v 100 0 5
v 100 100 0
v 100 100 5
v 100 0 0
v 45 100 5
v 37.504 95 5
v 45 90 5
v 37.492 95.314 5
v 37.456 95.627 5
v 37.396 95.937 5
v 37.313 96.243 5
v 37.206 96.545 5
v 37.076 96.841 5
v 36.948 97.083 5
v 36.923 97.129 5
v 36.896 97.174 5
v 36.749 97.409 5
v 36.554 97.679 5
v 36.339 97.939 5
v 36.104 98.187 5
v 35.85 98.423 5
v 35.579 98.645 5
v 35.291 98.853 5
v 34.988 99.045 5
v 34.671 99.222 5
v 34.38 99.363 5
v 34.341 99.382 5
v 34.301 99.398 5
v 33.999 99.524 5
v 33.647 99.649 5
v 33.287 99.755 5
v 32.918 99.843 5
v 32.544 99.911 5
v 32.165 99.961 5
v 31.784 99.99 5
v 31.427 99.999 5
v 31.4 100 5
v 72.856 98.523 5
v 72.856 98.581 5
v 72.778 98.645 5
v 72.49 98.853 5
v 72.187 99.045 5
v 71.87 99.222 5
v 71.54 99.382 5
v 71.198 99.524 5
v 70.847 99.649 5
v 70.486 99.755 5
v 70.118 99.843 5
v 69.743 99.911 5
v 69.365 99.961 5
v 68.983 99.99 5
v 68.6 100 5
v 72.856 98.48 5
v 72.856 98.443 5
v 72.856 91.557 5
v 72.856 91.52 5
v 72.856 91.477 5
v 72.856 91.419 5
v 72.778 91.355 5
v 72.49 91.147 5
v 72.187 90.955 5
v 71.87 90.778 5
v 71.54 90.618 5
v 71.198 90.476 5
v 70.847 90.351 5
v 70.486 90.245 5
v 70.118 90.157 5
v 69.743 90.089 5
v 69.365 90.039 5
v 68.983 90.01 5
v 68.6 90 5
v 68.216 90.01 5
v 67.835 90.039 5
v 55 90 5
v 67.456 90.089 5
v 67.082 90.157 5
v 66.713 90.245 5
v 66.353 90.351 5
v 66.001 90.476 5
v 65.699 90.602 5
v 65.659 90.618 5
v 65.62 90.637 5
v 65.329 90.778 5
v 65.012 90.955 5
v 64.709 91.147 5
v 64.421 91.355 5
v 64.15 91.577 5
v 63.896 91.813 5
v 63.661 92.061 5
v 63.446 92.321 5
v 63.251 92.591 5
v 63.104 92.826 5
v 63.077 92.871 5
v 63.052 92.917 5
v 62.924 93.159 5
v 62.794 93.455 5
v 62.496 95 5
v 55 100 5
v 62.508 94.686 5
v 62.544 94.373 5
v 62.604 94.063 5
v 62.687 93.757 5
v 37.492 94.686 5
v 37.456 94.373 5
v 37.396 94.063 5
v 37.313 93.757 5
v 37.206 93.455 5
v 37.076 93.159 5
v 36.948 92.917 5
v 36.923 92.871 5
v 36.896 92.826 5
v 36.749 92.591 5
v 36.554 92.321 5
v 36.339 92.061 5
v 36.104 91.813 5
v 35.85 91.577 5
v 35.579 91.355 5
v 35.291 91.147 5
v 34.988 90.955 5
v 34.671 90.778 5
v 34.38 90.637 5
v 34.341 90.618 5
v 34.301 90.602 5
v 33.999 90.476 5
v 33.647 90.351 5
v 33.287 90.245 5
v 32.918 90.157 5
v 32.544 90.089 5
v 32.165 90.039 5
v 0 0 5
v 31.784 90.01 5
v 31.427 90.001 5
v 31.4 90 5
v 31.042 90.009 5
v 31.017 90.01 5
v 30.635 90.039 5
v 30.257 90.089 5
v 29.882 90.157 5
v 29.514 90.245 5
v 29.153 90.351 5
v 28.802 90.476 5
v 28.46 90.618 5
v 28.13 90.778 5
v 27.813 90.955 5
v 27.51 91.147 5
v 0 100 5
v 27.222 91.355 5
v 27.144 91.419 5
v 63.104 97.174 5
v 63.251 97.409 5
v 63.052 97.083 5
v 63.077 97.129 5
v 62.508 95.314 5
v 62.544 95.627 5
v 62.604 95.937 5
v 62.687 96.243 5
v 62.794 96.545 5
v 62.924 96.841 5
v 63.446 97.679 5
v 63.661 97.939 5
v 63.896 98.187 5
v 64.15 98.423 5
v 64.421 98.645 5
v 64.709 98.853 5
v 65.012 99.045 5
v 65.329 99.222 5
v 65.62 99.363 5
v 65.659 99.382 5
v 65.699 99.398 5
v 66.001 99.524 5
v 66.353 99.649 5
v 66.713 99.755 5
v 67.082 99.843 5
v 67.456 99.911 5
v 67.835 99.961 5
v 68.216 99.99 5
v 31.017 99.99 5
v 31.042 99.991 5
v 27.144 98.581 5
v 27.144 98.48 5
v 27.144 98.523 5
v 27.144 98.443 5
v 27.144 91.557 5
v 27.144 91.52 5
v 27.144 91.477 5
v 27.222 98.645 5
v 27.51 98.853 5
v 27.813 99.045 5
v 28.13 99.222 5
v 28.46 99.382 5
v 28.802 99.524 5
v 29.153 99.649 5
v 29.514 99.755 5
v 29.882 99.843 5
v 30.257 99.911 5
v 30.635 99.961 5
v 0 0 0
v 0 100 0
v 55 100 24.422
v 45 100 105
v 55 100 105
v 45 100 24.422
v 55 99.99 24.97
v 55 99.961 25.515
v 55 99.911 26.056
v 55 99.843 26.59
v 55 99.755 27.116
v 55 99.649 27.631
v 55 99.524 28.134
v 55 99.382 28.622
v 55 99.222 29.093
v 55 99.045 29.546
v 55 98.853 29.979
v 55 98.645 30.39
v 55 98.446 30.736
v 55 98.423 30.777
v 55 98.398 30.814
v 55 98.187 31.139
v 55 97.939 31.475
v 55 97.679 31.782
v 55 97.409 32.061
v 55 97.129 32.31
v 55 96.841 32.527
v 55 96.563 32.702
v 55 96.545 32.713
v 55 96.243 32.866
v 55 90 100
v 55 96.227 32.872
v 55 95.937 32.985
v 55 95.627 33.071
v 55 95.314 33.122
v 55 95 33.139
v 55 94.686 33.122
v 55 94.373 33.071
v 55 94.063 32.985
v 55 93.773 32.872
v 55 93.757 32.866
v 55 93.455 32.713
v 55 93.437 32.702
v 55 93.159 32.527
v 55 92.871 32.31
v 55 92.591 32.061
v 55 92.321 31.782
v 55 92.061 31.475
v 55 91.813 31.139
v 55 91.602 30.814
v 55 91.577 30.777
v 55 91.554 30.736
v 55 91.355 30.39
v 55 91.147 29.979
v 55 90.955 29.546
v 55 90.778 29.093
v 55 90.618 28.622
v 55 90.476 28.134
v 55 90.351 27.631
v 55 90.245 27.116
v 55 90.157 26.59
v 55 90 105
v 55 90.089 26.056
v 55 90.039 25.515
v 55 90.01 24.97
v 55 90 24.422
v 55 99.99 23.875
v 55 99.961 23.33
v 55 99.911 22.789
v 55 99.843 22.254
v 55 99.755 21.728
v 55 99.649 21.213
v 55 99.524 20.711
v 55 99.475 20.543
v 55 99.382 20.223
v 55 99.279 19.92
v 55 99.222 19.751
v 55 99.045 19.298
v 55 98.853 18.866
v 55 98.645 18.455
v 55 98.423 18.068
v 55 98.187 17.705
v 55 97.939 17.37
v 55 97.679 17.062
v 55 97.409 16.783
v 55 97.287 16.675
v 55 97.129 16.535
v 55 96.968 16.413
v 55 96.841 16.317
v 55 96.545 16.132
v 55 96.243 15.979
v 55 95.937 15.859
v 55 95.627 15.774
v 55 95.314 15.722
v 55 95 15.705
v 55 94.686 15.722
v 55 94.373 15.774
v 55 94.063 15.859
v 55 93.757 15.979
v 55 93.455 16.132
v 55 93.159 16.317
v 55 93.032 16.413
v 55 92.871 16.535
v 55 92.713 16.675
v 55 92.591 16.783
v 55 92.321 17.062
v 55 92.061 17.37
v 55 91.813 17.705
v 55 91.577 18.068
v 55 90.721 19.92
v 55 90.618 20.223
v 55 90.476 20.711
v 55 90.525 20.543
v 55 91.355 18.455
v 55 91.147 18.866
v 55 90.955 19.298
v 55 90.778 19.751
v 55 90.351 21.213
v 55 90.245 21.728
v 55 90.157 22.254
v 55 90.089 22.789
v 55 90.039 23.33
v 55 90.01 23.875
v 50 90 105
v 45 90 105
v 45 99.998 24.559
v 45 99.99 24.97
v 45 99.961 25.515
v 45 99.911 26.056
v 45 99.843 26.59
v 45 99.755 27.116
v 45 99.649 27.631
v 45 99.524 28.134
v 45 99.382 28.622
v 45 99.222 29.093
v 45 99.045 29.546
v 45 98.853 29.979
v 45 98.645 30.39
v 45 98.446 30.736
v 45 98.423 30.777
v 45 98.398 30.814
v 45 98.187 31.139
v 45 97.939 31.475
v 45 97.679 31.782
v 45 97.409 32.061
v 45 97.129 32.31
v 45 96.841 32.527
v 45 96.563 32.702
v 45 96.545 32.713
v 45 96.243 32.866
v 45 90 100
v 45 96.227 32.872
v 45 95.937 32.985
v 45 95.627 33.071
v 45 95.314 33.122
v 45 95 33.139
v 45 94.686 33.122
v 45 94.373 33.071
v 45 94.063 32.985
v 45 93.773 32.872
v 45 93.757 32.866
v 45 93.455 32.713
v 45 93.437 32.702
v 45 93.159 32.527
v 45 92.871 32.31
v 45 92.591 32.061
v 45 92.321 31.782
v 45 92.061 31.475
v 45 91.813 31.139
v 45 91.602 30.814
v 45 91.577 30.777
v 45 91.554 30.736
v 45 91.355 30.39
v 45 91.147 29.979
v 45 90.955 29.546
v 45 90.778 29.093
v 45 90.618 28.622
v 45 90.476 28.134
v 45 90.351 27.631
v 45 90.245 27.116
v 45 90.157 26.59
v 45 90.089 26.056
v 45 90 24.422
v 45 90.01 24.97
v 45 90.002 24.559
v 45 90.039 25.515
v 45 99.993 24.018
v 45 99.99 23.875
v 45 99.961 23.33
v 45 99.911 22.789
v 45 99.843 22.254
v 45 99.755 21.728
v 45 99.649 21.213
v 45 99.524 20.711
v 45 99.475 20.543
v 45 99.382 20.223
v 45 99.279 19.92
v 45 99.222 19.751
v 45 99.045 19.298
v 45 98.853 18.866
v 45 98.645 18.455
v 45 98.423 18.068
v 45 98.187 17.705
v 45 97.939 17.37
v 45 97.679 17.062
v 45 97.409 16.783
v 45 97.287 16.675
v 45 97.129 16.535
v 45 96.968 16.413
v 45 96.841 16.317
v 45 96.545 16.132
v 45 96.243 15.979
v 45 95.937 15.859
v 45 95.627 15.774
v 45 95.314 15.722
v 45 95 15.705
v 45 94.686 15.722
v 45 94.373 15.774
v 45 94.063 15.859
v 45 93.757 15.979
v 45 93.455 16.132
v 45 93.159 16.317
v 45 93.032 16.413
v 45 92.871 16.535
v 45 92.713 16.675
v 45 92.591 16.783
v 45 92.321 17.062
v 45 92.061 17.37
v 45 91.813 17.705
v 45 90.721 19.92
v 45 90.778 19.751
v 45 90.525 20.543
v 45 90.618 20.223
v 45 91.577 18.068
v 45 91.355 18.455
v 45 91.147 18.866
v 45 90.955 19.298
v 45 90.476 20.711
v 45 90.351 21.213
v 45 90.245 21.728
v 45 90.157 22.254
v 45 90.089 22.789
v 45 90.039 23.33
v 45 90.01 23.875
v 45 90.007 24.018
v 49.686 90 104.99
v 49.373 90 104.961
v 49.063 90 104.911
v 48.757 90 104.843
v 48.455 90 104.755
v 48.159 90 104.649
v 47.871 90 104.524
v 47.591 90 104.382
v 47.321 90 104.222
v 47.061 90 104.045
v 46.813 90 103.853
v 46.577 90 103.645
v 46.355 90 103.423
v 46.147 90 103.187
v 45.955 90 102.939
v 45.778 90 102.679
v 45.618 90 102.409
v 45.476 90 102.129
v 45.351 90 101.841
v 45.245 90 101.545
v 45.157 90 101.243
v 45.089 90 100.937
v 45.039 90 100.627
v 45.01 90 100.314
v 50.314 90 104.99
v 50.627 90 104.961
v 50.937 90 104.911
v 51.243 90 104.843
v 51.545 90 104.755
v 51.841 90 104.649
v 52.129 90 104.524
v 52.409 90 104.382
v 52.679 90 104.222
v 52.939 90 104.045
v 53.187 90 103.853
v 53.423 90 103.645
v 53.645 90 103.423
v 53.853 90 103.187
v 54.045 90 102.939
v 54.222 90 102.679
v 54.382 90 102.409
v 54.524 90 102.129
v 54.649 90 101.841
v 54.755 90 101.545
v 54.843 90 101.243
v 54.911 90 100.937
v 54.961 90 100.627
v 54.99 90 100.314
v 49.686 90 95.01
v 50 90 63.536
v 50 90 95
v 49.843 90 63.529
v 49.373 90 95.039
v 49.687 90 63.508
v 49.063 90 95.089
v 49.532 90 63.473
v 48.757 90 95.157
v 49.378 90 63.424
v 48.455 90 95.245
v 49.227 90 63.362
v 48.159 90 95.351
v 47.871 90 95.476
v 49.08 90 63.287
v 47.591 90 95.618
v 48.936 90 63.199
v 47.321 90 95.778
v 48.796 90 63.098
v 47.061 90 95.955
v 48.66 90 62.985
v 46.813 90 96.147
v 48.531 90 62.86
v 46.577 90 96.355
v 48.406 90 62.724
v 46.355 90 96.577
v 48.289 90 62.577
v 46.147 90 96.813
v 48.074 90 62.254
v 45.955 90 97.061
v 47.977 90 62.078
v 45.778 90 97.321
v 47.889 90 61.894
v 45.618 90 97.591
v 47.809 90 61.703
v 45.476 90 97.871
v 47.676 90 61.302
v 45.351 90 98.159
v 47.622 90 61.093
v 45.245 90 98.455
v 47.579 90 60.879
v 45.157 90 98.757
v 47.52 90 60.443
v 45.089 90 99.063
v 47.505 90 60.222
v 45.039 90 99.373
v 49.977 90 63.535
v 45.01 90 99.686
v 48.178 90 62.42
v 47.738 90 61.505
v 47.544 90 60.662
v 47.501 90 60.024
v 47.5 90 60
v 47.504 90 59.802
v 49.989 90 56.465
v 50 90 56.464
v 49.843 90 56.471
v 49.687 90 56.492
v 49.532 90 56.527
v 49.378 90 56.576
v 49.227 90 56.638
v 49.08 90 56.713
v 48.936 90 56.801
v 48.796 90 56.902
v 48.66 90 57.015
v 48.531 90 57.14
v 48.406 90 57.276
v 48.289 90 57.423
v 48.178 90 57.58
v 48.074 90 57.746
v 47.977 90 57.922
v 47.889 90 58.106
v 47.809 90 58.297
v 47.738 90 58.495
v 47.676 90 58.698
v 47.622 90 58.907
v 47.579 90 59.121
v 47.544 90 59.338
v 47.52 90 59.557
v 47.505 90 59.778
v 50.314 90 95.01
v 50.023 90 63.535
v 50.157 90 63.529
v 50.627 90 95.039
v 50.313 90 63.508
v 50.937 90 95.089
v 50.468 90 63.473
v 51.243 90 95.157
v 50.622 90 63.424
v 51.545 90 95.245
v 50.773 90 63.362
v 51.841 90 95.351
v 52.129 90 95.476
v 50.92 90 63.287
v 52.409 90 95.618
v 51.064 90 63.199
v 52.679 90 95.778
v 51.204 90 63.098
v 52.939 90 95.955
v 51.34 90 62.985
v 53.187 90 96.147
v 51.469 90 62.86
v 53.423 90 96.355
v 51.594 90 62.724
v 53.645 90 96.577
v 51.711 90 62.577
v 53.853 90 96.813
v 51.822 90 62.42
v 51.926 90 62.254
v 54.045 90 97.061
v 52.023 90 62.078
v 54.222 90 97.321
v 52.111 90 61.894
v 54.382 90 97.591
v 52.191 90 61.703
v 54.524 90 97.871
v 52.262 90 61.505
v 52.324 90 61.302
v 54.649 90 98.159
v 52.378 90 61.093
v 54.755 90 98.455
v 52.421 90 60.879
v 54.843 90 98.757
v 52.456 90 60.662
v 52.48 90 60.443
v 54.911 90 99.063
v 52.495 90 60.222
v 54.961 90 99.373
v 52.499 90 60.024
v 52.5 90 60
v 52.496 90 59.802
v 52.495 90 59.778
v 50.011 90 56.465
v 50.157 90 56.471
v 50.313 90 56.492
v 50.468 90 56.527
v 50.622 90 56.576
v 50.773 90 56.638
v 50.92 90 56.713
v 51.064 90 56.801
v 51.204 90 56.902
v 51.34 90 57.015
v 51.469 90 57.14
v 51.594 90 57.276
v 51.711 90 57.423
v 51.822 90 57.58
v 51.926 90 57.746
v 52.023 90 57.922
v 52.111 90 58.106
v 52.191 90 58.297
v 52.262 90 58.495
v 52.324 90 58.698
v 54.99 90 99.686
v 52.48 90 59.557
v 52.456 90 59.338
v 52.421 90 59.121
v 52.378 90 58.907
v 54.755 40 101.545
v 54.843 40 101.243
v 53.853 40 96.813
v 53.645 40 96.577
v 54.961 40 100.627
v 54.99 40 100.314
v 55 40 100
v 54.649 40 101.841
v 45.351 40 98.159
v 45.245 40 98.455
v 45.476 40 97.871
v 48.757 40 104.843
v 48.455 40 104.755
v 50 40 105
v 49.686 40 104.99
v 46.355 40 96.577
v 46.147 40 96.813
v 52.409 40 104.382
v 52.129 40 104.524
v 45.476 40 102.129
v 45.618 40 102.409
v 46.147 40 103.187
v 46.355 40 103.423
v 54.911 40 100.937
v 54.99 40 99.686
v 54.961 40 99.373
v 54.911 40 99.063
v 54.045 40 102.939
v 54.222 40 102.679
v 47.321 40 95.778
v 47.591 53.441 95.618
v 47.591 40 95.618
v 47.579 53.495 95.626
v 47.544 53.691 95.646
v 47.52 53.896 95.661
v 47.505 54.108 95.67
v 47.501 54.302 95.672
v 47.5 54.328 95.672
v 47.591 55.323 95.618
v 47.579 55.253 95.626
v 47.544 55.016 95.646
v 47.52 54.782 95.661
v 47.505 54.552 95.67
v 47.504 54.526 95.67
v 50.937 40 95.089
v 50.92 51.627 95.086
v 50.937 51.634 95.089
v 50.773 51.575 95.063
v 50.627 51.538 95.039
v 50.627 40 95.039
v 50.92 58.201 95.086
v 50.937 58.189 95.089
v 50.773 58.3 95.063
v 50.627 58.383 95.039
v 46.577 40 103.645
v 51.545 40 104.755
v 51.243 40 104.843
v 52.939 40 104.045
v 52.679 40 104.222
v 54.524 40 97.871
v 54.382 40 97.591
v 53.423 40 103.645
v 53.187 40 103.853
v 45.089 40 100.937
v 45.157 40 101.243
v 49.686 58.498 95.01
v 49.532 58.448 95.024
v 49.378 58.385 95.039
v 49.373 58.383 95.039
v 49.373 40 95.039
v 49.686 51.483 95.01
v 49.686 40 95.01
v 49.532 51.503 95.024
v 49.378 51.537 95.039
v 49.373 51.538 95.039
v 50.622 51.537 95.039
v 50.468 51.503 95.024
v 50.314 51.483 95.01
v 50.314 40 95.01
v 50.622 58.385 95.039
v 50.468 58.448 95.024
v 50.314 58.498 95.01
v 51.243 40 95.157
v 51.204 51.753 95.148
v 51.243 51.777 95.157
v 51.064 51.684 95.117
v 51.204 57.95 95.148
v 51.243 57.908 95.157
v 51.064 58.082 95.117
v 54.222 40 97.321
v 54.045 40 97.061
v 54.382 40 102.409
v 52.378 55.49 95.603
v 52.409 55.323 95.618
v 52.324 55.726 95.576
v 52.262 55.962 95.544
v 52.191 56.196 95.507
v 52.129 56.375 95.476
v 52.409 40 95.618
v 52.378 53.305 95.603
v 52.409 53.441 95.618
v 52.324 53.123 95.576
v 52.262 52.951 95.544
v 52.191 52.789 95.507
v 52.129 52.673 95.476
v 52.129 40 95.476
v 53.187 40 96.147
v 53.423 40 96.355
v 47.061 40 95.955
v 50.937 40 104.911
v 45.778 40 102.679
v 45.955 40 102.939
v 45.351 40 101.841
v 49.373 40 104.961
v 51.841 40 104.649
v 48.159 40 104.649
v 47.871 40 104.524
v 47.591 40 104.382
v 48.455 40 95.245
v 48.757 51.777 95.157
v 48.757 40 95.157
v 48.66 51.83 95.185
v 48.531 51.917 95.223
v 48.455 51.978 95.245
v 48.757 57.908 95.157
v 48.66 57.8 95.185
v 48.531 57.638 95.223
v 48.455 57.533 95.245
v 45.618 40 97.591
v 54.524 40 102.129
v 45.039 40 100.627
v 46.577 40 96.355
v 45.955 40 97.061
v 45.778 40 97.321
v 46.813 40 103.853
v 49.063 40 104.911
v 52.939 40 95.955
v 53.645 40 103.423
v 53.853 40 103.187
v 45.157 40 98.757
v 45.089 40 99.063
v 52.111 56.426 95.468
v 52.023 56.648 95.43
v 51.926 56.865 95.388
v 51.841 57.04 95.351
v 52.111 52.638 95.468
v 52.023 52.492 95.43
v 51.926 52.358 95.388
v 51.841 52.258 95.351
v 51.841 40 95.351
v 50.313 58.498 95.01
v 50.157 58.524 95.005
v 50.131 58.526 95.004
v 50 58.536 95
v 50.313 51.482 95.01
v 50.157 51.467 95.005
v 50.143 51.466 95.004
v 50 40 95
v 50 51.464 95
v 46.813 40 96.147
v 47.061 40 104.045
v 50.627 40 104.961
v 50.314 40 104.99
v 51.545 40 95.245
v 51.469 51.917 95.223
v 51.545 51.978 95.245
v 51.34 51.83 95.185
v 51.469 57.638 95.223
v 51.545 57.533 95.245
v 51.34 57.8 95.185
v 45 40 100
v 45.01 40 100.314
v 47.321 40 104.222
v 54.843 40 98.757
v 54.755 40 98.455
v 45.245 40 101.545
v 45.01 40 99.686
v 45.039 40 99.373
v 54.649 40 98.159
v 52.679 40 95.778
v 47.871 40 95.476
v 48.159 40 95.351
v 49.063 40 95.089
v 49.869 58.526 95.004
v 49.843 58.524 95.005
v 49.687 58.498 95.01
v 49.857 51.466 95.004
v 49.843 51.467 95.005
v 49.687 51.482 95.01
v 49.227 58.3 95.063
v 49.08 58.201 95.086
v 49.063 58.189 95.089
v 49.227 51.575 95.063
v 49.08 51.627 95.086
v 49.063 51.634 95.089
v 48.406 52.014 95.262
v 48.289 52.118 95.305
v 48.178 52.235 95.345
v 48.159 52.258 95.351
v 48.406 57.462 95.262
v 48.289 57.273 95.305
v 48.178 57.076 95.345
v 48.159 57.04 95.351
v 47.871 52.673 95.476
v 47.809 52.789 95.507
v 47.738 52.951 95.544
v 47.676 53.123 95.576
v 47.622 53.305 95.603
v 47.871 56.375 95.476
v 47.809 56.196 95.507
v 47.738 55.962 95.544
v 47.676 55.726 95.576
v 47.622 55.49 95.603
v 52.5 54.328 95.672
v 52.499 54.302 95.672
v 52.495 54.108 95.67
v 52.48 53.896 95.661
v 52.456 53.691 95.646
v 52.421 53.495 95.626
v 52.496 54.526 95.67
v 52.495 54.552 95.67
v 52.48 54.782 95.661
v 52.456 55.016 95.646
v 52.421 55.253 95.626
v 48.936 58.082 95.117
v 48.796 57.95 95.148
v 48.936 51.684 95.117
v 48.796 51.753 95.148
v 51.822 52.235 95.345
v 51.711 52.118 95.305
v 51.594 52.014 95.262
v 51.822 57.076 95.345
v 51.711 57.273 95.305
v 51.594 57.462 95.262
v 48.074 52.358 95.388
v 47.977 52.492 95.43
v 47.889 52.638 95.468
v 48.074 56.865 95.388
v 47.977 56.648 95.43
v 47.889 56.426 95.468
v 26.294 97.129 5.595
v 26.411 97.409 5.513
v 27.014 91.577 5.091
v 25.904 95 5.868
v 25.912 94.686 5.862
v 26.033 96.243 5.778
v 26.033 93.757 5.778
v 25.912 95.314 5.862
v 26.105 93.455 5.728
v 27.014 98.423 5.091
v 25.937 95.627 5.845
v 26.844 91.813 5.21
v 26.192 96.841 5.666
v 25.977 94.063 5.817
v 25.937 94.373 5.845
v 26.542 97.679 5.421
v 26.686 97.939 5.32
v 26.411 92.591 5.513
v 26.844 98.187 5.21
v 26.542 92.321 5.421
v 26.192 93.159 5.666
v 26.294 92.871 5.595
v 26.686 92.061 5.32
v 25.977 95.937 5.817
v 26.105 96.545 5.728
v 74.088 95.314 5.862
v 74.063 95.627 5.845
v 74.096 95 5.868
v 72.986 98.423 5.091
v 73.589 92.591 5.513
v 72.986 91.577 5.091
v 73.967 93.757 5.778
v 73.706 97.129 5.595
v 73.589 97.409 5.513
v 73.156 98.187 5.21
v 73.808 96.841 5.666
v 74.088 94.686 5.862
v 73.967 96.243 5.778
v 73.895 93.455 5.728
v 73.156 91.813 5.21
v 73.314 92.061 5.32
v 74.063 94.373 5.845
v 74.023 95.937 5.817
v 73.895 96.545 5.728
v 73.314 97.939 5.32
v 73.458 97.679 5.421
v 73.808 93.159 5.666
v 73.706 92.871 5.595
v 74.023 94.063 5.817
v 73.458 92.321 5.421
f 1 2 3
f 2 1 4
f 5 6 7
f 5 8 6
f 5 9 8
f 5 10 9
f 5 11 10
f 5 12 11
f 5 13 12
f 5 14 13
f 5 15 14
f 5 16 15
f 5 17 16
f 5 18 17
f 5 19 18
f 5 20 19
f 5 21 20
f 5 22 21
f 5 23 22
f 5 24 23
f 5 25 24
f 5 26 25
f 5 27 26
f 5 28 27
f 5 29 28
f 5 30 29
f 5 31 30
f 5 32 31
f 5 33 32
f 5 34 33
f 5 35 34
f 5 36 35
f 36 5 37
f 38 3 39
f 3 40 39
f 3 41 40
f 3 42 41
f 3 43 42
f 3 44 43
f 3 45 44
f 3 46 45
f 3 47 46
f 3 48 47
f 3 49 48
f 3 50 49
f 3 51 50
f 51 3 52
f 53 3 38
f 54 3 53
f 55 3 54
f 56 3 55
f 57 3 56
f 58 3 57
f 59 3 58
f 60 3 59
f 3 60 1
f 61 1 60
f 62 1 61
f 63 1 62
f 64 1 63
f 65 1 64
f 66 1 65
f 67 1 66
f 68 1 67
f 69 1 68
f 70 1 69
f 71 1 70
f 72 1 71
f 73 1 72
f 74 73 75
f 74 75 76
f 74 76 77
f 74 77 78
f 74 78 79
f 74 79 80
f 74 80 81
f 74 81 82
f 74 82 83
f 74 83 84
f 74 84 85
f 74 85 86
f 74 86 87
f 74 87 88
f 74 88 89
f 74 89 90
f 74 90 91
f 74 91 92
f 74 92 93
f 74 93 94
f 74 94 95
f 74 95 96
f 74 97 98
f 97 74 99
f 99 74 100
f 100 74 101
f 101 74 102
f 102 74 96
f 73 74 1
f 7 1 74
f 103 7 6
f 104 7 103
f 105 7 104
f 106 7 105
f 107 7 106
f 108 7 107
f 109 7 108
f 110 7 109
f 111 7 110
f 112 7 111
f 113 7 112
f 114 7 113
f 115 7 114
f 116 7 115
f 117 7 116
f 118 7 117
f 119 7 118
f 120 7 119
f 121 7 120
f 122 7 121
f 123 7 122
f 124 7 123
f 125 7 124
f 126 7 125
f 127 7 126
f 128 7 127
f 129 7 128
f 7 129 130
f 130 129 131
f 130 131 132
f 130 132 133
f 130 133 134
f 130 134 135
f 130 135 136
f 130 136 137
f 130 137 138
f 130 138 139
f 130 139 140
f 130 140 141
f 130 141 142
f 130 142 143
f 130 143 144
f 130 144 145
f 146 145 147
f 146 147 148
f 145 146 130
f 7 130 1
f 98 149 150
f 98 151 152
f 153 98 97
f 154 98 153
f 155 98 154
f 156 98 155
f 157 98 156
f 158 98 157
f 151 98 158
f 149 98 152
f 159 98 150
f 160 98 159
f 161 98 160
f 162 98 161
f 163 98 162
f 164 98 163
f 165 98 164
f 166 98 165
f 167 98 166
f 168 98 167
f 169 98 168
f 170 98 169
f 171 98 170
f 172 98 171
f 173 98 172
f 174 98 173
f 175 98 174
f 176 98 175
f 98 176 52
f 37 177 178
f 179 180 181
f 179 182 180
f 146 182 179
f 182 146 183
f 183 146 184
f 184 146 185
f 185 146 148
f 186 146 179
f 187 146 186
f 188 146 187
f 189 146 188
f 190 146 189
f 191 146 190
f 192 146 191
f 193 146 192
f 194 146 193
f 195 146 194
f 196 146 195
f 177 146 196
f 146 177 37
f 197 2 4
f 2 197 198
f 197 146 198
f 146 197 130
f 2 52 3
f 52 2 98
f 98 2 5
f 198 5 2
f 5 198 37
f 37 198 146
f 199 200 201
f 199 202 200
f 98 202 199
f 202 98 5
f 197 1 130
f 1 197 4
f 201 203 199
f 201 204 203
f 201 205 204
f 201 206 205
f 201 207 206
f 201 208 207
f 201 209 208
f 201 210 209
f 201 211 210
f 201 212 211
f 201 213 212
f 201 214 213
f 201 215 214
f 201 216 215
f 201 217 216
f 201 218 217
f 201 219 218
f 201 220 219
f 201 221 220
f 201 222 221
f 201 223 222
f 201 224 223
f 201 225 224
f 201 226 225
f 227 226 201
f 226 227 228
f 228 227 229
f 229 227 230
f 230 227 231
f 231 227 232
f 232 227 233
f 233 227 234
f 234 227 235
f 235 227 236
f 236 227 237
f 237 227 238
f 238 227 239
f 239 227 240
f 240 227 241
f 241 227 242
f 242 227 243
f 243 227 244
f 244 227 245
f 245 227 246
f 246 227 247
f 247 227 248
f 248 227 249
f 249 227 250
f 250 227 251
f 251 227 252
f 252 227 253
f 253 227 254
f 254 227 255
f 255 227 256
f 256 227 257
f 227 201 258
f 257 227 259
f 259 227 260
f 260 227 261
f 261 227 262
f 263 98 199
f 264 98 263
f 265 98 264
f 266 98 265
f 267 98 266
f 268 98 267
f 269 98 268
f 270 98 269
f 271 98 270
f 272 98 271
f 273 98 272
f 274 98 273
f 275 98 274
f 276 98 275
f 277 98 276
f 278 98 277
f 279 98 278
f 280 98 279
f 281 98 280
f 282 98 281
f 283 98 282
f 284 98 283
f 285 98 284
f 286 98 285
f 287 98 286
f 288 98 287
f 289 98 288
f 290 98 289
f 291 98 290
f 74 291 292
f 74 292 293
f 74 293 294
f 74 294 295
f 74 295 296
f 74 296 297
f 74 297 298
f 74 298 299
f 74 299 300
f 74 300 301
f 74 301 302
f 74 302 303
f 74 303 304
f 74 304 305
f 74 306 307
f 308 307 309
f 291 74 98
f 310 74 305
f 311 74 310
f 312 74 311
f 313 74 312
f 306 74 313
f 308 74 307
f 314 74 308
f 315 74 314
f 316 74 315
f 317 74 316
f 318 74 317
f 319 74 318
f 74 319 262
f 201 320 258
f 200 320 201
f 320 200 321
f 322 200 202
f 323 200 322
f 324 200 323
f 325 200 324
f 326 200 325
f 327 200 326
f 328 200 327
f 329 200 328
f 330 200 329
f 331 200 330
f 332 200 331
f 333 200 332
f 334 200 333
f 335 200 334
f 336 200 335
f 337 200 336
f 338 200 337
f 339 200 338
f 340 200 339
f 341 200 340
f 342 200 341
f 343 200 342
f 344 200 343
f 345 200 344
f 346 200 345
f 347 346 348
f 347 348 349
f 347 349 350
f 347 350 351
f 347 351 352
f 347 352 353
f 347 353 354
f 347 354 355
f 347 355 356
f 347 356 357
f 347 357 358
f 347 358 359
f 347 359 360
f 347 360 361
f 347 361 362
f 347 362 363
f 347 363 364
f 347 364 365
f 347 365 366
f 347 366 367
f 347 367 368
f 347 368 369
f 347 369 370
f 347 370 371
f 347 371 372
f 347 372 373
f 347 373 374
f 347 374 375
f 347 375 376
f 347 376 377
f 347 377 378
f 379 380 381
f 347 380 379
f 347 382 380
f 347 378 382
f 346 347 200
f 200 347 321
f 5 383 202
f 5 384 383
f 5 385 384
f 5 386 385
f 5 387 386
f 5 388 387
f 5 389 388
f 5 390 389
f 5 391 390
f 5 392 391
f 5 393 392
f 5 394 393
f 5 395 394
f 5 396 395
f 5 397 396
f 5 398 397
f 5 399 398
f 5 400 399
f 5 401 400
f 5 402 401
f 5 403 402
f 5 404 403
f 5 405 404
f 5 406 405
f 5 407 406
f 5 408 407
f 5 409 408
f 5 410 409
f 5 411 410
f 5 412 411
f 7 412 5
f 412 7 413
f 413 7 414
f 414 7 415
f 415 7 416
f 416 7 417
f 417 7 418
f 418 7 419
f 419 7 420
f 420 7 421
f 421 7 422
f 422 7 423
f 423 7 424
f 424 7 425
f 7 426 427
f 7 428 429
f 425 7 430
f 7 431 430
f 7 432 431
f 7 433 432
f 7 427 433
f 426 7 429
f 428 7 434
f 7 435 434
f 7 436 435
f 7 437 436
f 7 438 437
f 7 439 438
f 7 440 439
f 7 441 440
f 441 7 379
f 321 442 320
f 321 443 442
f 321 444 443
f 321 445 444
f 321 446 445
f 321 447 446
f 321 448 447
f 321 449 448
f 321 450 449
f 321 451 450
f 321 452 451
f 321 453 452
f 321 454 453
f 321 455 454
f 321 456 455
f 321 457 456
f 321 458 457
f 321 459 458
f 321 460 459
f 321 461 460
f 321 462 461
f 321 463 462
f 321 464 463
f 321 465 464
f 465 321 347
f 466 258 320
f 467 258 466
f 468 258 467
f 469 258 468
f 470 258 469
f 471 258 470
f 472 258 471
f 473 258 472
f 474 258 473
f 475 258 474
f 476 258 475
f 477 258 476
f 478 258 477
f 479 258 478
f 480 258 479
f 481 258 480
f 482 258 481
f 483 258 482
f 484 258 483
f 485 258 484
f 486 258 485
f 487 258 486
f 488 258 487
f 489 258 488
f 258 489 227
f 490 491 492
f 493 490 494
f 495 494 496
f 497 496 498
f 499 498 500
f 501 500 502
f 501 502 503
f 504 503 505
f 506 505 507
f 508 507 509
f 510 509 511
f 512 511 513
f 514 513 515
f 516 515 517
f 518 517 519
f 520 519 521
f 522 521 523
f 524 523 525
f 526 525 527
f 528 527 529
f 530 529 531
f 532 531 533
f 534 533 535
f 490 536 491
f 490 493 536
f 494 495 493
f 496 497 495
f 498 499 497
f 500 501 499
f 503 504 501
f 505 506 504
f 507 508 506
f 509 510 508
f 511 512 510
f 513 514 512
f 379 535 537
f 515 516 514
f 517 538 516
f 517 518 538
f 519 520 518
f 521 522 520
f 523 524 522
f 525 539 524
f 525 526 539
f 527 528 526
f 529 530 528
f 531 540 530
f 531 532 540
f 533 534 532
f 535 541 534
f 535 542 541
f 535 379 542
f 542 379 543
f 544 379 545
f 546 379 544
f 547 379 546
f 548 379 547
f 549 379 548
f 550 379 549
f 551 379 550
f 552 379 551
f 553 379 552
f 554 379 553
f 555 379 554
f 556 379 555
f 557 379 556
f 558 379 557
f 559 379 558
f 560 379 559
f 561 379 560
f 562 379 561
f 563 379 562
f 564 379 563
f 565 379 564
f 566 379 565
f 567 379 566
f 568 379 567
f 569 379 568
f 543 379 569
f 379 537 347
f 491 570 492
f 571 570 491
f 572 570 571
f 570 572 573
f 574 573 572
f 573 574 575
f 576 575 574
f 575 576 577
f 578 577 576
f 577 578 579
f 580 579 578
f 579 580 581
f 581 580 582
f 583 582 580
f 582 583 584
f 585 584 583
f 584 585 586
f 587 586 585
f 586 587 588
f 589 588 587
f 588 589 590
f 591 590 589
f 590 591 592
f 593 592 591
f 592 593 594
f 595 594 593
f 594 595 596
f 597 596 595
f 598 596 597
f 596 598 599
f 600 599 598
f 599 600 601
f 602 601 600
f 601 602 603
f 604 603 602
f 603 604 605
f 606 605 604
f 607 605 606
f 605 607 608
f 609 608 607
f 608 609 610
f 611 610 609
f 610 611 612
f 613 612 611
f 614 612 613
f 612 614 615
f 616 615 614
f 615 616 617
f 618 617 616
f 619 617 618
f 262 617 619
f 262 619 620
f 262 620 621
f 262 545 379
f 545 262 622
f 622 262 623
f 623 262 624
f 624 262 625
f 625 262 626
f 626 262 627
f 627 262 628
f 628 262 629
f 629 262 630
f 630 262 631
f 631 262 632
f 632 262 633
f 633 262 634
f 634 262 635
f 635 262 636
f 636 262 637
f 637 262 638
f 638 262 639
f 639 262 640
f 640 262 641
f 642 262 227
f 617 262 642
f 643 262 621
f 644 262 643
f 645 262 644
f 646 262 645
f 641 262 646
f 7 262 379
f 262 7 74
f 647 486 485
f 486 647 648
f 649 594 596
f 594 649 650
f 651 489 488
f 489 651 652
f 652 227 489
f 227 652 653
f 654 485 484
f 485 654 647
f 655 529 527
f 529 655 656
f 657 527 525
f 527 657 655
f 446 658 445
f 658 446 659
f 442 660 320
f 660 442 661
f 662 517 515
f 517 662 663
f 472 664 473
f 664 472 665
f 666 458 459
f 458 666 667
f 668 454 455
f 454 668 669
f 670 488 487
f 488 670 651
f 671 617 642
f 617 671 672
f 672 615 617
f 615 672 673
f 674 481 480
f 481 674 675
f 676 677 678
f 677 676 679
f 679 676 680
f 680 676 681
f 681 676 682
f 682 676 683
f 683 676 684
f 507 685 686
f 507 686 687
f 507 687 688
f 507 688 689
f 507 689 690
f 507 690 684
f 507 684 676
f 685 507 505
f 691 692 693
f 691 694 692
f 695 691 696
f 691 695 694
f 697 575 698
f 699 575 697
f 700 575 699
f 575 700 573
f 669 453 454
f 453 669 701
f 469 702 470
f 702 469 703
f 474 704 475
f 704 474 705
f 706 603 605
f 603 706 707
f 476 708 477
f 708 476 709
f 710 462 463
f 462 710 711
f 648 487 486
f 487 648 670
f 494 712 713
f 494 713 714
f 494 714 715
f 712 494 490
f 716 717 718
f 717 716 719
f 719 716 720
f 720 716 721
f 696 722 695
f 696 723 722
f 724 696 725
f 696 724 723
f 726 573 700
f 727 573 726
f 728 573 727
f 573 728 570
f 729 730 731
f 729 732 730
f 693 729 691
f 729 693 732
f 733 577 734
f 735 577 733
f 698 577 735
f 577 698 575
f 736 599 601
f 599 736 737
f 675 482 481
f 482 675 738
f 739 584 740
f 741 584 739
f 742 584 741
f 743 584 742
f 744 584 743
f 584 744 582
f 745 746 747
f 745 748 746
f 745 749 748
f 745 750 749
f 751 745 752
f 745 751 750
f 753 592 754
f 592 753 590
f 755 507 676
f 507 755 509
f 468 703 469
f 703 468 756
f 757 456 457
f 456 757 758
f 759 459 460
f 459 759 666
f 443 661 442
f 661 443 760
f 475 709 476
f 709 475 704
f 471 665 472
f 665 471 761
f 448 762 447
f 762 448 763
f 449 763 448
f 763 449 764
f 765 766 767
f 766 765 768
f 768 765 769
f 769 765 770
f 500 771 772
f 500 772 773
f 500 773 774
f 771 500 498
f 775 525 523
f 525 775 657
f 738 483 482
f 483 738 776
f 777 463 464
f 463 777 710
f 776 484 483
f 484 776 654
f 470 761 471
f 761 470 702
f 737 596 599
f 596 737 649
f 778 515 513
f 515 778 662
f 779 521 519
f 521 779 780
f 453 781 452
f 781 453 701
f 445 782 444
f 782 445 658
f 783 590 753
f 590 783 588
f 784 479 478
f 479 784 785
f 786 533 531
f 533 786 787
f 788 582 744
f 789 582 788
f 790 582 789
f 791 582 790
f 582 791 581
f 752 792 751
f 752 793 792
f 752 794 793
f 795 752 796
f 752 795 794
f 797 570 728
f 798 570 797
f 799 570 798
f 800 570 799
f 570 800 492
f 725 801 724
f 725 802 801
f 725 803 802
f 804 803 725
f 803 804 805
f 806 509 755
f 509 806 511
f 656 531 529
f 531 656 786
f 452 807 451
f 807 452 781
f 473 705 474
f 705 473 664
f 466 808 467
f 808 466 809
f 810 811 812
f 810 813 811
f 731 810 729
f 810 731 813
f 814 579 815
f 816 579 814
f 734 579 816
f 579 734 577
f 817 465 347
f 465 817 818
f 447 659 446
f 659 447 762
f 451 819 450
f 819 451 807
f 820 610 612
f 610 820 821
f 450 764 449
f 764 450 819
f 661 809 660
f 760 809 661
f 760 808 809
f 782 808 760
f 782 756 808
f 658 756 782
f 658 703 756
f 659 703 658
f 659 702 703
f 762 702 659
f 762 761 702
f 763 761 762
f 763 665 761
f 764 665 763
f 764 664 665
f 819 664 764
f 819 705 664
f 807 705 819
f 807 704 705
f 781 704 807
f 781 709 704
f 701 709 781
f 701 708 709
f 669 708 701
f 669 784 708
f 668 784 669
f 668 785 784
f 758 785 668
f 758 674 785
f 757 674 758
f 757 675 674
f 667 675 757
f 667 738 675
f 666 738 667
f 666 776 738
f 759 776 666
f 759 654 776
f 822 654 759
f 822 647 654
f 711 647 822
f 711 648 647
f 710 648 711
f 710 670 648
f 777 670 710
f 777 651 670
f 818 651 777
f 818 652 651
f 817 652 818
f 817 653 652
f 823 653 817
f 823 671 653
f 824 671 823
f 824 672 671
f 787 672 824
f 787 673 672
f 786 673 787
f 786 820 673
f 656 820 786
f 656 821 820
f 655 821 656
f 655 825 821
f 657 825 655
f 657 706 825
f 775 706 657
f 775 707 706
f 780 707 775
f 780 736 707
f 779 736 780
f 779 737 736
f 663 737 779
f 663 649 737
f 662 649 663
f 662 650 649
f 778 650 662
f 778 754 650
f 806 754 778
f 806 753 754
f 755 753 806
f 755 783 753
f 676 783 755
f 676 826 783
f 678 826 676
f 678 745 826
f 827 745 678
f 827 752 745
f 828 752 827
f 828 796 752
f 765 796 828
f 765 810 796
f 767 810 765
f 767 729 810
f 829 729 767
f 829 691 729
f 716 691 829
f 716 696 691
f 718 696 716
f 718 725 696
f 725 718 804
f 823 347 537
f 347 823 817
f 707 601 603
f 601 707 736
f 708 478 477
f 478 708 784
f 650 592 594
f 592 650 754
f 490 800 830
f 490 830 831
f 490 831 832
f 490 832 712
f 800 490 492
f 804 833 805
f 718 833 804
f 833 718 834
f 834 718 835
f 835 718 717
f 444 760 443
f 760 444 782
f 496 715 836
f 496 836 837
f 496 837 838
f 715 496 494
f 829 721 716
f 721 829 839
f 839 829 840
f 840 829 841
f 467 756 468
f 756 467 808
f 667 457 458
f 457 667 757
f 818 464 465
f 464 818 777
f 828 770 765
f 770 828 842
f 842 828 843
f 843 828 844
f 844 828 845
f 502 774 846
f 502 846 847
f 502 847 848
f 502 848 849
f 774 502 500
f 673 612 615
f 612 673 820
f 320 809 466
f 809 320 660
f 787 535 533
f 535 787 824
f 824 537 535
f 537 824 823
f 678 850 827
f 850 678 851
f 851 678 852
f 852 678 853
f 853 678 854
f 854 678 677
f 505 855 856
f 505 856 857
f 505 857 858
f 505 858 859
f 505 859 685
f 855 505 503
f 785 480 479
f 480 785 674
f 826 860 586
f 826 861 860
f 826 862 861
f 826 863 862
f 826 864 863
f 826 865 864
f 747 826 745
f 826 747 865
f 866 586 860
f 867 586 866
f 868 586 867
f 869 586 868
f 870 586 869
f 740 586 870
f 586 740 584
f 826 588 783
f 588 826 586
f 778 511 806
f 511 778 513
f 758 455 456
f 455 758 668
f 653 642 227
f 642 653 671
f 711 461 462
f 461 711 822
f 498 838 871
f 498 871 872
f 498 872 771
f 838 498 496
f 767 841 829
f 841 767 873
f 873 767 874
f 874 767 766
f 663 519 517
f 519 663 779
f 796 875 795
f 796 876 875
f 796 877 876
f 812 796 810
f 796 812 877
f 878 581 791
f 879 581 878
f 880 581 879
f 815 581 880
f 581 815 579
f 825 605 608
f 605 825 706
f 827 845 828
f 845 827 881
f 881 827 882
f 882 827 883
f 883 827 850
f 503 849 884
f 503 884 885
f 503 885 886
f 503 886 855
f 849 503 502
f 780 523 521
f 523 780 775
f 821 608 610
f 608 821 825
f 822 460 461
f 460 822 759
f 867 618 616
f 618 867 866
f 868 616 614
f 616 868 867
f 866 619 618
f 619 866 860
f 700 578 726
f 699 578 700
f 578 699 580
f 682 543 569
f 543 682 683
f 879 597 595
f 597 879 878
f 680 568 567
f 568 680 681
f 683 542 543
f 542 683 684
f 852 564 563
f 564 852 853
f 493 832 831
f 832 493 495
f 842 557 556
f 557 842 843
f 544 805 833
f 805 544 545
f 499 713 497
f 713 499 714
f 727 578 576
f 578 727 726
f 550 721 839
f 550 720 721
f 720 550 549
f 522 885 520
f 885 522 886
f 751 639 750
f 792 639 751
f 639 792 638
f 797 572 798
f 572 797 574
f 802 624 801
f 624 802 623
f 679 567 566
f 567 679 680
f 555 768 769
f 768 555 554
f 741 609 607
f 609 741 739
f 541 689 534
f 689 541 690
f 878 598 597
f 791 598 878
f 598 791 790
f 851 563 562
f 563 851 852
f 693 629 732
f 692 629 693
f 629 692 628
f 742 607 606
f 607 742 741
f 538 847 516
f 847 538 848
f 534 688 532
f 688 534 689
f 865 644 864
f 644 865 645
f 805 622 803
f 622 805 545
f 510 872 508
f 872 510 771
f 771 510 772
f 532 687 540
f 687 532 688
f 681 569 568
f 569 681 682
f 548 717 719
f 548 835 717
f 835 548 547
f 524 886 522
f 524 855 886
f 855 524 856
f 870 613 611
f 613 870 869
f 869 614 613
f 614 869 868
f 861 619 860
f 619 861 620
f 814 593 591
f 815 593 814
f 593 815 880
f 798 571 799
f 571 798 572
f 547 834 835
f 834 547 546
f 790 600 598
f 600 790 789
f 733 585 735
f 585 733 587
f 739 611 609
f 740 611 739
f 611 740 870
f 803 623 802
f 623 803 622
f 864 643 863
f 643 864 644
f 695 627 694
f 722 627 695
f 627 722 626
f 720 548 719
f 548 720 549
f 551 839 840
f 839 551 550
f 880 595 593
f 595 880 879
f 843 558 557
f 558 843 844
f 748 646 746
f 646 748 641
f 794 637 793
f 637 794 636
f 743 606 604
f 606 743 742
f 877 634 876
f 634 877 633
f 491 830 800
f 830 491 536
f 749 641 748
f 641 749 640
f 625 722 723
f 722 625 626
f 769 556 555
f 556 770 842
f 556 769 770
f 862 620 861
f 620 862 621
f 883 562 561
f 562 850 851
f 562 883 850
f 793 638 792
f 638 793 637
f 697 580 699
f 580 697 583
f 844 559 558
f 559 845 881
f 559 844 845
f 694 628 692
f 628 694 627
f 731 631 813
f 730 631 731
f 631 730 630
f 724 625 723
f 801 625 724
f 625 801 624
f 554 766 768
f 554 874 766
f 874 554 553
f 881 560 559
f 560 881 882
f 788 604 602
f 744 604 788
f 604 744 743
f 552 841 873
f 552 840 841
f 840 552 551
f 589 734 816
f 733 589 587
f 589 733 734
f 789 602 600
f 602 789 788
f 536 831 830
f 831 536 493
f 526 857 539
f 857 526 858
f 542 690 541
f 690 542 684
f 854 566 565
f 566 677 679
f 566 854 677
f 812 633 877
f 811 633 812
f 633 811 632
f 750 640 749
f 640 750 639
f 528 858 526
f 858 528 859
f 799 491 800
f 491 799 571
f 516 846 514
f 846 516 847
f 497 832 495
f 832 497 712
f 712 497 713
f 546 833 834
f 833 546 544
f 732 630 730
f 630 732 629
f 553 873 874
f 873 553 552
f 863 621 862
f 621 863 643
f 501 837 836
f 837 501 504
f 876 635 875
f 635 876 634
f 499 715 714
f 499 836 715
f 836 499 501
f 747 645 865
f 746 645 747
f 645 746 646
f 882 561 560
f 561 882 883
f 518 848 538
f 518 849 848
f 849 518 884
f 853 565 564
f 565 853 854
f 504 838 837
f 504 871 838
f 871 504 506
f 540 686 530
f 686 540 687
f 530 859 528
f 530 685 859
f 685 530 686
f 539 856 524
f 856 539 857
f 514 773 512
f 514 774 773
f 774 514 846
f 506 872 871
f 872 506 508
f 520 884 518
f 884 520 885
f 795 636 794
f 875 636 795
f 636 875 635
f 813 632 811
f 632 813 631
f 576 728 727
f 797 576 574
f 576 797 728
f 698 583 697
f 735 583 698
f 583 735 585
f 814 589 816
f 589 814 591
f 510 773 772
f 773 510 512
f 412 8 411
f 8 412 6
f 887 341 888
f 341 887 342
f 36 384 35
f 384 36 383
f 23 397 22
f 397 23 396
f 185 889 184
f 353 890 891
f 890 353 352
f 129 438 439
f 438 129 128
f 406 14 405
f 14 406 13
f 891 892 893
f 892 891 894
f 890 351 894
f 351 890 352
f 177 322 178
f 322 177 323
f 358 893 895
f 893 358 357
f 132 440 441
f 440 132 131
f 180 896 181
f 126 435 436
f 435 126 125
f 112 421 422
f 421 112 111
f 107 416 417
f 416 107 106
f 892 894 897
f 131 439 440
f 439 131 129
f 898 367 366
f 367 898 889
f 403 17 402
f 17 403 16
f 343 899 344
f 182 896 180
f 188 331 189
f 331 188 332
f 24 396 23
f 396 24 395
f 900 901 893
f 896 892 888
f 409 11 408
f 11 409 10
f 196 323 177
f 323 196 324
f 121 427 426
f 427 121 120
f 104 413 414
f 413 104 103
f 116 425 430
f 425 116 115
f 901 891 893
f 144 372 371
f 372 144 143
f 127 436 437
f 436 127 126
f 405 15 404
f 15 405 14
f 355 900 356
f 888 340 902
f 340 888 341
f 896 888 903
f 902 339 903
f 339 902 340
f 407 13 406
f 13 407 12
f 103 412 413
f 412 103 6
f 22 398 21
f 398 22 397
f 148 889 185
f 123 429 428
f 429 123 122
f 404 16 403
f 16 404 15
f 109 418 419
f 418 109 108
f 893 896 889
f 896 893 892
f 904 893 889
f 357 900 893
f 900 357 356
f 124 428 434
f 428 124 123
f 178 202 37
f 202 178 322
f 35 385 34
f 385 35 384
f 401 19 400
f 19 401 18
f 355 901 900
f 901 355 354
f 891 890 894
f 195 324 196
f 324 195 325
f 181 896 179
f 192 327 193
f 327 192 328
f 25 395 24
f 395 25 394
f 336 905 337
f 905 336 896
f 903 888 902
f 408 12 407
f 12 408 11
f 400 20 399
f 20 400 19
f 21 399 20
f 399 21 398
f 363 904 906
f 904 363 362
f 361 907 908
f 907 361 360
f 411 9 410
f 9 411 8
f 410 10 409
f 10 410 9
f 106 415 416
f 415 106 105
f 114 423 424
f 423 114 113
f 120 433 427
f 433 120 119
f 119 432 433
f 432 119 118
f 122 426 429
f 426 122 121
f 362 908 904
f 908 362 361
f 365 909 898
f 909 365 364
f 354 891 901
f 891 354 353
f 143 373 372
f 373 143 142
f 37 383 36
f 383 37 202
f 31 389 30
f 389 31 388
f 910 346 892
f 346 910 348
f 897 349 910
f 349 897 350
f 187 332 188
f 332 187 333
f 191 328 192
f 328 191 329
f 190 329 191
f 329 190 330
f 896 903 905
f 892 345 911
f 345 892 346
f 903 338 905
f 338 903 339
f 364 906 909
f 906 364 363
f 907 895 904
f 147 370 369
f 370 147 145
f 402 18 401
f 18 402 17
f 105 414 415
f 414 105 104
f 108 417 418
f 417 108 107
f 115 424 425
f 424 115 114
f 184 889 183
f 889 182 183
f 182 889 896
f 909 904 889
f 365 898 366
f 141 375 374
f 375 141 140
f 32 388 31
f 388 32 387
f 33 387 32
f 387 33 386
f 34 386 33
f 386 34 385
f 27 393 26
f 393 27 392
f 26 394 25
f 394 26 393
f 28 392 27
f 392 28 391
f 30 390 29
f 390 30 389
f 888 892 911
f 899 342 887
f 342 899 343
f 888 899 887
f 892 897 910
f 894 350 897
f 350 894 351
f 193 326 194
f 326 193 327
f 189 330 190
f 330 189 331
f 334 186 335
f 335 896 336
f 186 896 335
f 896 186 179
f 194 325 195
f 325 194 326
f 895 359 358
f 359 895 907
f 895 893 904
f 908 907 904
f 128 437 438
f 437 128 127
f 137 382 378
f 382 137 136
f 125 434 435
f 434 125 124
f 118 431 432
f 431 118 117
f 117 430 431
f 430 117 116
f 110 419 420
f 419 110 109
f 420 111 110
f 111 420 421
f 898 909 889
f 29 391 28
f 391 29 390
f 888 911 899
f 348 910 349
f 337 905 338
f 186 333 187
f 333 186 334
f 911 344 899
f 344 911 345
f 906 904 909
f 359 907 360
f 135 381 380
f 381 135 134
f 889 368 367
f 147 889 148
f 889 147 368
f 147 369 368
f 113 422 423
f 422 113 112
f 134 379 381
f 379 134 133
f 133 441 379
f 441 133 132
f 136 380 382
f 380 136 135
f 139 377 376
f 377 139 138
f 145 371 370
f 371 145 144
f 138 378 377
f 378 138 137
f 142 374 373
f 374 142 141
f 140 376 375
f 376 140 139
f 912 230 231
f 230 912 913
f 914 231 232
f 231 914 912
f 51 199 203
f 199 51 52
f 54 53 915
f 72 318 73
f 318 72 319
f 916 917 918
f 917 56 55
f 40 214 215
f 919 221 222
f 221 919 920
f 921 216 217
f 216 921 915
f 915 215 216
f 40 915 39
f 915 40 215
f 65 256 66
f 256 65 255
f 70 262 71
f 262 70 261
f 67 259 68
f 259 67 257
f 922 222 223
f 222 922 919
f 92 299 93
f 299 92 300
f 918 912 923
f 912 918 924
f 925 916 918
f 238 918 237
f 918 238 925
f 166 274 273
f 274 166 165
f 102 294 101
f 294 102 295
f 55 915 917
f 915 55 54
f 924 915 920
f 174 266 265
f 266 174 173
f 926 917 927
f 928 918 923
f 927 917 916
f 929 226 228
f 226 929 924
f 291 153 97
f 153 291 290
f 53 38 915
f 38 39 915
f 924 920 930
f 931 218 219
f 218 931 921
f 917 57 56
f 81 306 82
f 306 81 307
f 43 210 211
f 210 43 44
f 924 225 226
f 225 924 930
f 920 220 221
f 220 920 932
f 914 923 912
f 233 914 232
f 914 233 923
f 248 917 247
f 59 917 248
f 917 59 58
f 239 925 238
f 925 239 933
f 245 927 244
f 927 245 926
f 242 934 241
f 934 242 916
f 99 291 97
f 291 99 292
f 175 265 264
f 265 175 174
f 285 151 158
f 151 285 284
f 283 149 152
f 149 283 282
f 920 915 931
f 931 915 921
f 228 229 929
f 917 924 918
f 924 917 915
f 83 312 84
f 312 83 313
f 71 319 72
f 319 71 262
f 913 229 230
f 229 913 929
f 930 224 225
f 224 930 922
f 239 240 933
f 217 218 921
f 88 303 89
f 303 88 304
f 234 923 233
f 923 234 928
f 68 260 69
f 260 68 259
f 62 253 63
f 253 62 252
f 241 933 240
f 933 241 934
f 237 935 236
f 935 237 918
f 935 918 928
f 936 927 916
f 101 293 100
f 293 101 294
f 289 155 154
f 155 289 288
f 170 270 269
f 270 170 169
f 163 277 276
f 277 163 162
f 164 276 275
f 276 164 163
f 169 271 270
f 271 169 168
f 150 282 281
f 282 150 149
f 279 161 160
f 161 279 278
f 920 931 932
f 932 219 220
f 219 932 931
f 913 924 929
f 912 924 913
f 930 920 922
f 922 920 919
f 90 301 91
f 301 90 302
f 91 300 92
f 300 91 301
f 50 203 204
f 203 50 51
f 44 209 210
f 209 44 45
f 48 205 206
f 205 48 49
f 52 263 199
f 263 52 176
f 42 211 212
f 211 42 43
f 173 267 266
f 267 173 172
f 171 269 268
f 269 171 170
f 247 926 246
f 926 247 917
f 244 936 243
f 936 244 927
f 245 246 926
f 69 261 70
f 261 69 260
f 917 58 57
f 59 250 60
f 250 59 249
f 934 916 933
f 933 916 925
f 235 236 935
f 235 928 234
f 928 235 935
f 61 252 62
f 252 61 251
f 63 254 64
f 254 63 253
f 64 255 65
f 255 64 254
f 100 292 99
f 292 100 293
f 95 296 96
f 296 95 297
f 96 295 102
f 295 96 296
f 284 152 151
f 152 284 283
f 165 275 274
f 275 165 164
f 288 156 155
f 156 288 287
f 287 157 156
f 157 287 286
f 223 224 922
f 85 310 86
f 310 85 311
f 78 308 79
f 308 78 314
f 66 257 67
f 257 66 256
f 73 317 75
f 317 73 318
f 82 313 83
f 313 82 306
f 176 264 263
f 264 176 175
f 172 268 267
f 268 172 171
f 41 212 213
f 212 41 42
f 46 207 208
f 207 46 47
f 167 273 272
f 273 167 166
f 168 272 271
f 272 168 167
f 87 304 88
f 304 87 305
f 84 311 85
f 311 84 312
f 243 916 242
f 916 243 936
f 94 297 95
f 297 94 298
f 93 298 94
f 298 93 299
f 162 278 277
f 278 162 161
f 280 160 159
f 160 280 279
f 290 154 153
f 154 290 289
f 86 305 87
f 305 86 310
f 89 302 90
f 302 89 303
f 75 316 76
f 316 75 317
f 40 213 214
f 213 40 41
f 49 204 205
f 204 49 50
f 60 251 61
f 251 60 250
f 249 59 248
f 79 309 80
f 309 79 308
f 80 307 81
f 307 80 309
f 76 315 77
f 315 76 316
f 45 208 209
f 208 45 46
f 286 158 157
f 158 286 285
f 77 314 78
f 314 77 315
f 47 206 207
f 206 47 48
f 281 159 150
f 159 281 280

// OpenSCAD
module headphone_holder() {
    // Bundplade
    translate([0, 0, 0])
        cube([100, 100, 5]);

    // Lodret rektangel
    translate([45, 90, 5])
        cube([10, 10, 100]);

    // Vandret cylinder
    translate([50, 90, 100])
        rotate([90, 0, 0])
        cylinder(h = 50, d = 10, $fn=100);
    
     // Cylinder, der starter i midten af rektanglen og har en vinkel
    translate([50, 95, 55])
        rotate([45, 0, 0])
        cylinder(h = 65, d = 5, $fn=100);
  
     // Cylinder som støtte til højre
    translate([30, 95, 3])
        rotate([0, 35, 0])
        cylinder(h = 35, d = 10, $fn=100);
        
          // Cylinder som støtte til venstre
    translate([70, 95, 3])
        rotate([0, -35, 0])
        cylinder(h = 35, d = 10, $fn=100);
}


headphone_holder();
